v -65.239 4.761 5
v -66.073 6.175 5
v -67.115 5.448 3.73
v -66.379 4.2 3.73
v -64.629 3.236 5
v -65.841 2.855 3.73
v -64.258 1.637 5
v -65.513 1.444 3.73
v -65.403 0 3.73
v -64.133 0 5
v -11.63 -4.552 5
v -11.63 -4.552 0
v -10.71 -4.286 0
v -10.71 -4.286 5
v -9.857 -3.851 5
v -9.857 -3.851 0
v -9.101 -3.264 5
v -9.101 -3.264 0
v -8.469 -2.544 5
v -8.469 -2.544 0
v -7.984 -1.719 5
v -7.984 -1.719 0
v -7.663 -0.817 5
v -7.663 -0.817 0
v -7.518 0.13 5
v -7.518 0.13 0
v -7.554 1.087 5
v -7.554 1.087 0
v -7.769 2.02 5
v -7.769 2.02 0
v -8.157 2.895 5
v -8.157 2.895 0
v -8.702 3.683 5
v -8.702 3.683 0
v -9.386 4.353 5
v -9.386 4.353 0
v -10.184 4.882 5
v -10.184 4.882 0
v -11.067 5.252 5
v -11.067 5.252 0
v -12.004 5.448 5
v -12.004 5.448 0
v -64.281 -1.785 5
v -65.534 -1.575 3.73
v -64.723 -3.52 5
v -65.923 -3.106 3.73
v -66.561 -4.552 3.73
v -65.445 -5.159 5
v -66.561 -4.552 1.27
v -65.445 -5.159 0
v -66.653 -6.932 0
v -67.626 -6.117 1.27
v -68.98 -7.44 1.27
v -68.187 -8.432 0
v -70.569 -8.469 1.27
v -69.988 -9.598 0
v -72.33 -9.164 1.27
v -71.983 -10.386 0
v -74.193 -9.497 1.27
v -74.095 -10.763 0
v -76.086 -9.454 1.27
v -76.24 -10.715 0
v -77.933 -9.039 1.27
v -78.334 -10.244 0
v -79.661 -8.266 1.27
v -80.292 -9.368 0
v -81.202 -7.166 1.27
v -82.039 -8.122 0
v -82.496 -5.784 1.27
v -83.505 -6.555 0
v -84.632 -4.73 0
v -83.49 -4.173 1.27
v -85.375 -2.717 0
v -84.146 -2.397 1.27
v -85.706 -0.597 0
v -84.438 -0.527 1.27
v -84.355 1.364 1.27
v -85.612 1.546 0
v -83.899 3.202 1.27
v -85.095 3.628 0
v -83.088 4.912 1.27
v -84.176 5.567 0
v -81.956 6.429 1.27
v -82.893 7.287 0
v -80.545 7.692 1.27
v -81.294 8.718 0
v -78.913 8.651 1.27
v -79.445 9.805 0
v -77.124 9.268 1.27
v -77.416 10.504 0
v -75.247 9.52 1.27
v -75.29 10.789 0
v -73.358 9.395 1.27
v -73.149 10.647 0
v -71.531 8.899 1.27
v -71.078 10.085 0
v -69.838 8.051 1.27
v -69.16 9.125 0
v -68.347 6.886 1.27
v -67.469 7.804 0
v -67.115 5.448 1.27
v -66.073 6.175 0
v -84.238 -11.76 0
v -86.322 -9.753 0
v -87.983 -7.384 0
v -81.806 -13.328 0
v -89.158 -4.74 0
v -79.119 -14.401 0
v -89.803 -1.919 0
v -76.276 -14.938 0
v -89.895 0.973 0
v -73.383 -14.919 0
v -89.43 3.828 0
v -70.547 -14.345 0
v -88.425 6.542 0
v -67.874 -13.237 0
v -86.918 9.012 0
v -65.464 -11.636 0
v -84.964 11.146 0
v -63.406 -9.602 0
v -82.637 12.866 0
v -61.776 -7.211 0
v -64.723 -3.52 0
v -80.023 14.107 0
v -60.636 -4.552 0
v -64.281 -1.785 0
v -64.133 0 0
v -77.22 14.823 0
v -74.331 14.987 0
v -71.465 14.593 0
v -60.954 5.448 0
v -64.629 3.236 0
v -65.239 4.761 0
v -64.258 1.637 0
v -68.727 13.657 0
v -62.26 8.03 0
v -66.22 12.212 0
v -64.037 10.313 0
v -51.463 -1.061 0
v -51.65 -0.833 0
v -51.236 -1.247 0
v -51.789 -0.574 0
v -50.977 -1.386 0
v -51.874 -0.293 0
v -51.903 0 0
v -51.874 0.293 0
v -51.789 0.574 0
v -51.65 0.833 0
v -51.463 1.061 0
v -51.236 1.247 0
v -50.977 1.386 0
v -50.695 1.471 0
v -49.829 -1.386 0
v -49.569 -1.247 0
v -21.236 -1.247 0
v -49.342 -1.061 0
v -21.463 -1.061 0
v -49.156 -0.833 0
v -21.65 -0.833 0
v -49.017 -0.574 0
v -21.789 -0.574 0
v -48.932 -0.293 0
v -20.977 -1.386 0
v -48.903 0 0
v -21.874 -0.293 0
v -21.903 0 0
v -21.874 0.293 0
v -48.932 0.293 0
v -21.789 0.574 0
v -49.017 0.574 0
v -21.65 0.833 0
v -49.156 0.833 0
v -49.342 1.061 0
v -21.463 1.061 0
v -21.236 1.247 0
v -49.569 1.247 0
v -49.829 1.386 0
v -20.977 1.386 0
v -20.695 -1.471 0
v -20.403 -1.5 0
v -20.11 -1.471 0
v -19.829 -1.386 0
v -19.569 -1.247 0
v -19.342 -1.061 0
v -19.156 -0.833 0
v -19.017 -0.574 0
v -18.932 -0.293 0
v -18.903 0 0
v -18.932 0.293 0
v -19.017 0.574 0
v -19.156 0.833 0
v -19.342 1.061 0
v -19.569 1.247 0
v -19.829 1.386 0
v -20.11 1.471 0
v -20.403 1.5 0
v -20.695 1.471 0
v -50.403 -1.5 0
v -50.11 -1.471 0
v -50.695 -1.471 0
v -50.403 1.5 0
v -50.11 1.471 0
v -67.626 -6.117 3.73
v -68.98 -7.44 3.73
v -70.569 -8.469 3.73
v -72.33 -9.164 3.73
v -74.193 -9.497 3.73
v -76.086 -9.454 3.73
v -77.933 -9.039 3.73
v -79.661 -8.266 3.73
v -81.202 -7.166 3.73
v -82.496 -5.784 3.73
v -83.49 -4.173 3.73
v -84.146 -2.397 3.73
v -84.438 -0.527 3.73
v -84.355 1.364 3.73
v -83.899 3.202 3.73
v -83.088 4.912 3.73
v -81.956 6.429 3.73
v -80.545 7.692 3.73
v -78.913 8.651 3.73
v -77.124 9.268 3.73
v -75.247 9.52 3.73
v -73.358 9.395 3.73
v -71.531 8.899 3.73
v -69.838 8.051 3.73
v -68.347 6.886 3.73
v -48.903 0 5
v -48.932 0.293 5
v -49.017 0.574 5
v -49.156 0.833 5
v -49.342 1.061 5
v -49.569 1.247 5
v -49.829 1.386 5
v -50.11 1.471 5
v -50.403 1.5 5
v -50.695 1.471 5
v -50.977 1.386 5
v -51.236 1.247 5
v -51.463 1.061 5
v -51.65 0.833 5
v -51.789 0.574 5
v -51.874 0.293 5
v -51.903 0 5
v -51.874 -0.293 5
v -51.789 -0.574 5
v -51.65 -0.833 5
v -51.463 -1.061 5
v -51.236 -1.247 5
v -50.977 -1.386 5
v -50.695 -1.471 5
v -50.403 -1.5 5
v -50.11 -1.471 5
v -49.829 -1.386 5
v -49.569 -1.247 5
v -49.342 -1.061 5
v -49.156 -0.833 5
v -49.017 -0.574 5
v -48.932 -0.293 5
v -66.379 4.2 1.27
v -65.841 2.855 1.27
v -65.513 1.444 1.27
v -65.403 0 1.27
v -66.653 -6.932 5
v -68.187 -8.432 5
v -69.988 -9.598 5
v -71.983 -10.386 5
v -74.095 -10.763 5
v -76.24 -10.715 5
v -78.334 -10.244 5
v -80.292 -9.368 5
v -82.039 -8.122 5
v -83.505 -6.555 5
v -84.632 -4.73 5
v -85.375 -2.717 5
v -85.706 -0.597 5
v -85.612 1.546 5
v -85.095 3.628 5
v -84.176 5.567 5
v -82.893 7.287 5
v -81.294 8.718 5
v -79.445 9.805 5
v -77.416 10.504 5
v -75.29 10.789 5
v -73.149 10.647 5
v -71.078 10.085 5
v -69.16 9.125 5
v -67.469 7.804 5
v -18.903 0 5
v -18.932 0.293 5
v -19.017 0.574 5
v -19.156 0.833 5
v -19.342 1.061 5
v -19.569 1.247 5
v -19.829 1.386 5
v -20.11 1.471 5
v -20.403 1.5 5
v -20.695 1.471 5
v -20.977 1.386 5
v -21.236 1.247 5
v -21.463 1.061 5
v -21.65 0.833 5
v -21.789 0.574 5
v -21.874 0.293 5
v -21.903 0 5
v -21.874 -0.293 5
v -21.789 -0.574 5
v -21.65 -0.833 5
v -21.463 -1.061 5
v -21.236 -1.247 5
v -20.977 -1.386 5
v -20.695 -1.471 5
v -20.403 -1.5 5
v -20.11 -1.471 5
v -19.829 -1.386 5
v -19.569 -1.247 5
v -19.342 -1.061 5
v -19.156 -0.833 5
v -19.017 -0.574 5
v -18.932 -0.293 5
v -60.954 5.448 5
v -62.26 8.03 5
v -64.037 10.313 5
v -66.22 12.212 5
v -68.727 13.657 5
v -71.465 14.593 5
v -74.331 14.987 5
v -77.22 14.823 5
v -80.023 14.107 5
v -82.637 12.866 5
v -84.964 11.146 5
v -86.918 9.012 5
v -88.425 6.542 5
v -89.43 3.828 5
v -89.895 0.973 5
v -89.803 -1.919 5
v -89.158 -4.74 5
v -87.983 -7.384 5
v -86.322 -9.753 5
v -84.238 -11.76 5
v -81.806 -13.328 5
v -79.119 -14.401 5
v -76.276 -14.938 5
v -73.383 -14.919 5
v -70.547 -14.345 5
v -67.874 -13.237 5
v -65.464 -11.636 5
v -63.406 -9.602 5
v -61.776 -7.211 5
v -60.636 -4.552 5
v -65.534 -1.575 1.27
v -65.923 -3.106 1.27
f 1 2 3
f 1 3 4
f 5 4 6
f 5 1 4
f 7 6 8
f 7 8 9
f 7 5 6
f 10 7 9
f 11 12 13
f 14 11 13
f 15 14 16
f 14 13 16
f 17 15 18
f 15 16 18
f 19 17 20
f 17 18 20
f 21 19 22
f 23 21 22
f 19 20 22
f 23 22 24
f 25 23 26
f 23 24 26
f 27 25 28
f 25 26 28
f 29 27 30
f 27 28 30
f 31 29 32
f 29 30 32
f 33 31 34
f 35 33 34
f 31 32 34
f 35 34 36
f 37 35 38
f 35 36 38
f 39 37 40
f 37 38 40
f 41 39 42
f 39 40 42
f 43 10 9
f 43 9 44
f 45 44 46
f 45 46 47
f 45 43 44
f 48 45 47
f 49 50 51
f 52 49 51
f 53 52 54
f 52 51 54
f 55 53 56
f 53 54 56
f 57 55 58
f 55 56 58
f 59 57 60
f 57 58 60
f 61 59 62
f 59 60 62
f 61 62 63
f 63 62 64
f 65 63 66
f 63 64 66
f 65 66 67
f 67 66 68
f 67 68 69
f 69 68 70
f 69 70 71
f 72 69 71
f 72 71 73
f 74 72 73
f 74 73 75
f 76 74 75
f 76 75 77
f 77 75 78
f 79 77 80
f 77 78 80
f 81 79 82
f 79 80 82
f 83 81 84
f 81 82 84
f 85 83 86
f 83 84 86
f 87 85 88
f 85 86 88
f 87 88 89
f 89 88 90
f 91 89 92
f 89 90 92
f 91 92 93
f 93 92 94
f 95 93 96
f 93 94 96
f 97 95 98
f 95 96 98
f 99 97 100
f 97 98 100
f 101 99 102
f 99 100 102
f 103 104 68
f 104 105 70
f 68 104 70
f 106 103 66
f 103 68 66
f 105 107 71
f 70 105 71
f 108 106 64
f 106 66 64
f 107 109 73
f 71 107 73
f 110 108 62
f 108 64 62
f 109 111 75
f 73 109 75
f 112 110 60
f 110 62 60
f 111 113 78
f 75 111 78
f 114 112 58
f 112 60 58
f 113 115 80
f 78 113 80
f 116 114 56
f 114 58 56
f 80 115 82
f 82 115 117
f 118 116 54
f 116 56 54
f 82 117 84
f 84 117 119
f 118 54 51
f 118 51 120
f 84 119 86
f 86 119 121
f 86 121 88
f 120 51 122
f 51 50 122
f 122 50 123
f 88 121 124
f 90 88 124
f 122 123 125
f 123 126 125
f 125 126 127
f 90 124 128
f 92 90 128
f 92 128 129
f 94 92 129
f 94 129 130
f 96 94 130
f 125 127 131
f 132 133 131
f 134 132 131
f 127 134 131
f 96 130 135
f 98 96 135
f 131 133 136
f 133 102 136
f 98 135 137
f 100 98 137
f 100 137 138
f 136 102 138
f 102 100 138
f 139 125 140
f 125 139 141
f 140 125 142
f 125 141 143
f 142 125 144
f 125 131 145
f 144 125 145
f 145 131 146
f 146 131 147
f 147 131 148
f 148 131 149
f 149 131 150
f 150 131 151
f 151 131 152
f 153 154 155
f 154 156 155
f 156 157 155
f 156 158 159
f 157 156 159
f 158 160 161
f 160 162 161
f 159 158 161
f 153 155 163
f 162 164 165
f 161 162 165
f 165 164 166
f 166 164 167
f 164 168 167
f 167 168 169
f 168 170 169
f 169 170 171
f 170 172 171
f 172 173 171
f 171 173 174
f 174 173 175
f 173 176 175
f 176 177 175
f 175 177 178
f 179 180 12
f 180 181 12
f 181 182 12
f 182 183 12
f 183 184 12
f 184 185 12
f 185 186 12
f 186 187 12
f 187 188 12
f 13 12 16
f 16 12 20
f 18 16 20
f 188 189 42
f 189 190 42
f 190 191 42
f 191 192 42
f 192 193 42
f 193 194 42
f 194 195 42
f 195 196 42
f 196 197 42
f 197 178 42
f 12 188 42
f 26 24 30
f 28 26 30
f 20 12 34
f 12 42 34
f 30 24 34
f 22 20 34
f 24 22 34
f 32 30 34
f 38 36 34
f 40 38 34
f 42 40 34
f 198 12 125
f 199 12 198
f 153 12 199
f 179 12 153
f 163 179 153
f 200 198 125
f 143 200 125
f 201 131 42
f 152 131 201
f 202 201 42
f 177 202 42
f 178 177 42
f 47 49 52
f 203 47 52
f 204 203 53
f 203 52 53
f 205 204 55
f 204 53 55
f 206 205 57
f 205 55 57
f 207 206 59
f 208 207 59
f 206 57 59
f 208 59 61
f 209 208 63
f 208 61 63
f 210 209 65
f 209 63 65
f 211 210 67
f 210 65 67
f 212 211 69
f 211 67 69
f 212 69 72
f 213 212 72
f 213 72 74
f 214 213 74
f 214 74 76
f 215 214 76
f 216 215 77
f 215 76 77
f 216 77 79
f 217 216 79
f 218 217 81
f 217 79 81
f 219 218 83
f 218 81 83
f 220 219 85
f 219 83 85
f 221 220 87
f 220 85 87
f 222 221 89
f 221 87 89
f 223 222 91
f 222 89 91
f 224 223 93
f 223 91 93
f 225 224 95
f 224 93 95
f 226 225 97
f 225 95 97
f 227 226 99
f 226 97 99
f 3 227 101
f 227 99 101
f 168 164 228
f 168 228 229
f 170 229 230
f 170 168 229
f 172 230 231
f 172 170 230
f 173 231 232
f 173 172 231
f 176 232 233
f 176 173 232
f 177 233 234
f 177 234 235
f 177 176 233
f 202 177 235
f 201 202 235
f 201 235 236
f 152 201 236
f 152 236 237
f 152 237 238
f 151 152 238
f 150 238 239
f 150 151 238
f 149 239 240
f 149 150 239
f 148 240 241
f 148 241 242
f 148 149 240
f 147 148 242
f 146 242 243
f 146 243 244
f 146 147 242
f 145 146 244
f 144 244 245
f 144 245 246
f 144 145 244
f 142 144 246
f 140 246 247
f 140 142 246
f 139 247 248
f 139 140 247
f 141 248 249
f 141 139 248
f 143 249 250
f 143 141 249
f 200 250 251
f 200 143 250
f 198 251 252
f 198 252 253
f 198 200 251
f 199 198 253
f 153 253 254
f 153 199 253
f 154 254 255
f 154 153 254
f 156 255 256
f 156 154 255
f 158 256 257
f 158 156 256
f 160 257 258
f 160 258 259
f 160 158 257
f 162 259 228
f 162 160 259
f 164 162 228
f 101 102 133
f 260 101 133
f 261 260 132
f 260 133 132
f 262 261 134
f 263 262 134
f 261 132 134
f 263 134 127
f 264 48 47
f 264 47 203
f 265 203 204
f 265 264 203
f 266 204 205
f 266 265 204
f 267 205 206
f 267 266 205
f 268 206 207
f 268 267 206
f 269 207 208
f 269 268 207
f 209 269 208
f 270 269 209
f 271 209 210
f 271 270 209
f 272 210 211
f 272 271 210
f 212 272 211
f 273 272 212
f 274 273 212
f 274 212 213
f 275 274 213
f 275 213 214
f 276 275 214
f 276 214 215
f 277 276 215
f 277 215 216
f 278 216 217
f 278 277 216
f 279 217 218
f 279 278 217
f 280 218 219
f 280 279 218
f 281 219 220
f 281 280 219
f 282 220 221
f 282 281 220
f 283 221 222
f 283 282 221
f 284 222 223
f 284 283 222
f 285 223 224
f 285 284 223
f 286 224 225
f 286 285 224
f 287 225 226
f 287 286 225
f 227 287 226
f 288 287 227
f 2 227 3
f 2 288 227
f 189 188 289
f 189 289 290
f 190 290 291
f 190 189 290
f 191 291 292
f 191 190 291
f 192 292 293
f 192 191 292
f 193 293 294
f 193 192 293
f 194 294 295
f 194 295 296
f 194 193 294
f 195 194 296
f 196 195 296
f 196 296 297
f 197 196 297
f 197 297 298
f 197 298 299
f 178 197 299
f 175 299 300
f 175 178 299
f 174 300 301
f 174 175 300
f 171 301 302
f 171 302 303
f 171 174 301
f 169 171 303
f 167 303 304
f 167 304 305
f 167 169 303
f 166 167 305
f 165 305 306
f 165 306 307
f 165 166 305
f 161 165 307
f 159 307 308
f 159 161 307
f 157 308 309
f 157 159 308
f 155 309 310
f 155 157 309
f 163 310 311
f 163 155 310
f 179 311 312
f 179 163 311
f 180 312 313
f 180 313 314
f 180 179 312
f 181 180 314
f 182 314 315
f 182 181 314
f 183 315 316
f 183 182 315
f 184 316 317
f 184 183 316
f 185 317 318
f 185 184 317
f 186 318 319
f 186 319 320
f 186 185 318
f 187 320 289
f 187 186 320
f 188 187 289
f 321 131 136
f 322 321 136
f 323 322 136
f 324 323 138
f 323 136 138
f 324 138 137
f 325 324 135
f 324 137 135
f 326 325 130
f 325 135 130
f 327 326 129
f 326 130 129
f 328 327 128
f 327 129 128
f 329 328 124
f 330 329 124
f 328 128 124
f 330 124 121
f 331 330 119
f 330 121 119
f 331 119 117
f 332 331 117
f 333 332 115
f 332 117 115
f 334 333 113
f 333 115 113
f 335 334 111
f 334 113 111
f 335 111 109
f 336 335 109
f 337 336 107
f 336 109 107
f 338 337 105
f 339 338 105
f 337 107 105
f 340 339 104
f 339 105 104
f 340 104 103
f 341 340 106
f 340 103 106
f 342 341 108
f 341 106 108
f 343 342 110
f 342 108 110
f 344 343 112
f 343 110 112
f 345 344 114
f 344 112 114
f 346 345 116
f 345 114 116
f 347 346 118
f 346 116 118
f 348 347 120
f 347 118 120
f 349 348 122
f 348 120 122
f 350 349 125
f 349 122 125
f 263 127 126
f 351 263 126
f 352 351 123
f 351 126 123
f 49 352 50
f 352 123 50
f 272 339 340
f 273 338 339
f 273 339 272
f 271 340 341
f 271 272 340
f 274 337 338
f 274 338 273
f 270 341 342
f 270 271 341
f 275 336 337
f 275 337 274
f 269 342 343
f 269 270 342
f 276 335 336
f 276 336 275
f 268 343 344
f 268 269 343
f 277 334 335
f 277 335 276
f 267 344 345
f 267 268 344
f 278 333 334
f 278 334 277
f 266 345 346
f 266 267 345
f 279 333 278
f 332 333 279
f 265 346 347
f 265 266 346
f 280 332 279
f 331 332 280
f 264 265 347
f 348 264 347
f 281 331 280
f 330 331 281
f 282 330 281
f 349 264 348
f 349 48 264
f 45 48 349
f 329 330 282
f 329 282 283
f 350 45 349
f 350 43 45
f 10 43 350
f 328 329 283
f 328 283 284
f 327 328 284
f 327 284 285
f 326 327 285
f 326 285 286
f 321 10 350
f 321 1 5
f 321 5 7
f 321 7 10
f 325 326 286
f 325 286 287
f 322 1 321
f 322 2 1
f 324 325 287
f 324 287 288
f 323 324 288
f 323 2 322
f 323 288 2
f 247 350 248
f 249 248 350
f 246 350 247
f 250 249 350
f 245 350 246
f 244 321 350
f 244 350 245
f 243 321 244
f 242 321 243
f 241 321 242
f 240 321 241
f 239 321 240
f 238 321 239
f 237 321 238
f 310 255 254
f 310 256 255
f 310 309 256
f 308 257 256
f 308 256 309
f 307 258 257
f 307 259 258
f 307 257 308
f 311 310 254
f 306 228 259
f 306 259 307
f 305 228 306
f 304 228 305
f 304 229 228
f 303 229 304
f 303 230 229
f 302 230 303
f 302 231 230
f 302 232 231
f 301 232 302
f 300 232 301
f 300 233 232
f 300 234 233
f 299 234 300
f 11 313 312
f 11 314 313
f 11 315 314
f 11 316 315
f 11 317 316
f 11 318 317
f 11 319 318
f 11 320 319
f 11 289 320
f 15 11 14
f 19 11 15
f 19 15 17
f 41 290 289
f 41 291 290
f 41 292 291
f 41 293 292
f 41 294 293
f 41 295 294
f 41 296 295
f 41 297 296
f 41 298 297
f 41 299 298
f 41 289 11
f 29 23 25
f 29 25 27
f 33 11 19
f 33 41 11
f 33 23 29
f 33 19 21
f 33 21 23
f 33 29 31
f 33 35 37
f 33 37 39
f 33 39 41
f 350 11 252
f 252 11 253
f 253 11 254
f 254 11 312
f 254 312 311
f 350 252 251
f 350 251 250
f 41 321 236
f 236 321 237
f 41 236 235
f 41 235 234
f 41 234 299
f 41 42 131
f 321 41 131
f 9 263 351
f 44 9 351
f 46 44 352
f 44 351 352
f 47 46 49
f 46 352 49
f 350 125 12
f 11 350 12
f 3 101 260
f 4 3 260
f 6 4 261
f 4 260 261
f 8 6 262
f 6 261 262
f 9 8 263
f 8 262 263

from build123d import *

# Parameters (mm, degrees)
F0_R     = 1.5
F1_DEPTH = 5
F2_SIZE  = 1.27


with BuildPart() as f1:
    # F0 (on Top) → F1 (new body)
    with BuildSketch(Plane.XY):
        with BuildLine():
            Line((-67.1149054365, 5.4482991469), (-60.9536656773, 5.4482991469))
            ThreePointArc((-60.9536656773, 5.4482991469), (-89.9189816406, -0.4755281134), (-60.6364599927, -4.5517008531))
            Line((-60.6364599927, -4.5517008531), (-66.5607646656, -4.5517008531))
            ThreePointArc((-66.5607646656, -4.5517008531), (-84.4382310461, -0.5270105536), (-67.1149054365, 5.4482991469))
        make_face()
        with BuildLine():
            ThreePointArc((-59.9291217554, 0), (-60.1874829455, 2.7718970869), (-60.9536656773, 5.4482991469))
            Line((-60.9536656773, 5.4482991469), (-67.1149054365, 5.4482991469))
            ThreePointArc((-67.1149054365, 5.4482991469), (-65.8409176364, 2.855485691), (-65.4028217554, 0))
            ThreePointArc((-65.4028217554, 0), (-65.69684554, -2.3483405013), (-66.5607646656, -4.5517008531))
            Line((-66.5607646656, -4.5517008531), (-60.6364599927, -4.5517008531))
            ThreePointArc((-60.6364599927, -4.5517008531), (-60.1070112283, -2.3031667351), (-59.9291217554, 0))
        make_face()
        with BuildLine():
            ThreePointArc((-11.6302119568, -4.5517008531), (-7.513293419, 0.6092107253), (-12.0040895417, 5.4482991469))
            Line((-12.0040895417, 5.4482991469), (-60.9536656773, 5.4482991469))
            ThreePointArc((-60.9536656773, 5.4482991469), (-60.1874829455, 2.7718970869), (-59.9291217554, 0))
            ThreePointArc((-59.9291217554, 0), (-60.1070112283, -2.3031667351), (-60.6364599927, -4.5517008531))
            Line((-60.6364599927, -4.5517008531), (-11.6302119568, -4.5517008531))
        make_face()
        with Locations((-50.4028217554, 0)):
            Circle(F0_R, mode=Mode.SUBTRACT)
        with Locations((-20.4028217554, 0)):
            Circle(F0_R, mode=Mode.SUBTRACT)
    extrude(amount=F1_DEPTH)

    # F2
    f2_edges = [f1.edges().sort_by_distance(p)[0] for p in [
        (-82.740738, -5.448299, 5),
        (-82.740738, -5.448299, 0),
    ]]
    chamfer(f2_edges, length=F2_SIZE)


solid = f1.part
